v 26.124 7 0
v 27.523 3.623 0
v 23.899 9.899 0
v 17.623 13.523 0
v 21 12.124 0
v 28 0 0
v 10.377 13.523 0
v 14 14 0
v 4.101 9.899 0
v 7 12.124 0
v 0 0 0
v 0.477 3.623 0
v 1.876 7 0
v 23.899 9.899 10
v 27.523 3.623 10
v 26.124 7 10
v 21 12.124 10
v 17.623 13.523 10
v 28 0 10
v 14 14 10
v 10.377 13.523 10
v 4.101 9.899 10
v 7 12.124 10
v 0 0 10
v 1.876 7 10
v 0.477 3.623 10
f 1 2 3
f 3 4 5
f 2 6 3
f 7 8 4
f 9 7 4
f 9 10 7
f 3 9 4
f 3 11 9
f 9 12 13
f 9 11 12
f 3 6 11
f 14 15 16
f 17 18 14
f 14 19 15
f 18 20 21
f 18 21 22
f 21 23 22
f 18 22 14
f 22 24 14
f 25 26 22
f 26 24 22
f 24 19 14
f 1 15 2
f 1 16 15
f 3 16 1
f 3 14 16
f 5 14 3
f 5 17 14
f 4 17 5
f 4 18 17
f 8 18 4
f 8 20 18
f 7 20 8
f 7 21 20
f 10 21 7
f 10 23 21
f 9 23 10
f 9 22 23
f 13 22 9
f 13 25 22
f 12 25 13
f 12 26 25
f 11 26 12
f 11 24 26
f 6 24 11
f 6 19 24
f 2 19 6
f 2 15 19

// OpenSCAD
$fn = 32;

// ----------------------------------------------------------------------
// Key bar: woodruff key, 10 mm thick
// ----------------------------------------------------------------------

// --- parameters (mm) ---
profile_height = 10;      // extrusion height
profile_points = 13;      // points of the closed outline

profile = [[28, 0], [27.523, 3.623], [26.124, 7], [23.899, 9.899], [21, 12.124], [17.623, 13.523], [14, 14], [10.377, 13.523], [7, 12.124], [4.101, 9.899], [1.876, 7], [0.477, 3.623], [0, 0]];  // single closed polygon, 13 points, counter clockwise

// --- the one profile operation ---
linear_extrude(height = profile_height) polygon(points = profile);
